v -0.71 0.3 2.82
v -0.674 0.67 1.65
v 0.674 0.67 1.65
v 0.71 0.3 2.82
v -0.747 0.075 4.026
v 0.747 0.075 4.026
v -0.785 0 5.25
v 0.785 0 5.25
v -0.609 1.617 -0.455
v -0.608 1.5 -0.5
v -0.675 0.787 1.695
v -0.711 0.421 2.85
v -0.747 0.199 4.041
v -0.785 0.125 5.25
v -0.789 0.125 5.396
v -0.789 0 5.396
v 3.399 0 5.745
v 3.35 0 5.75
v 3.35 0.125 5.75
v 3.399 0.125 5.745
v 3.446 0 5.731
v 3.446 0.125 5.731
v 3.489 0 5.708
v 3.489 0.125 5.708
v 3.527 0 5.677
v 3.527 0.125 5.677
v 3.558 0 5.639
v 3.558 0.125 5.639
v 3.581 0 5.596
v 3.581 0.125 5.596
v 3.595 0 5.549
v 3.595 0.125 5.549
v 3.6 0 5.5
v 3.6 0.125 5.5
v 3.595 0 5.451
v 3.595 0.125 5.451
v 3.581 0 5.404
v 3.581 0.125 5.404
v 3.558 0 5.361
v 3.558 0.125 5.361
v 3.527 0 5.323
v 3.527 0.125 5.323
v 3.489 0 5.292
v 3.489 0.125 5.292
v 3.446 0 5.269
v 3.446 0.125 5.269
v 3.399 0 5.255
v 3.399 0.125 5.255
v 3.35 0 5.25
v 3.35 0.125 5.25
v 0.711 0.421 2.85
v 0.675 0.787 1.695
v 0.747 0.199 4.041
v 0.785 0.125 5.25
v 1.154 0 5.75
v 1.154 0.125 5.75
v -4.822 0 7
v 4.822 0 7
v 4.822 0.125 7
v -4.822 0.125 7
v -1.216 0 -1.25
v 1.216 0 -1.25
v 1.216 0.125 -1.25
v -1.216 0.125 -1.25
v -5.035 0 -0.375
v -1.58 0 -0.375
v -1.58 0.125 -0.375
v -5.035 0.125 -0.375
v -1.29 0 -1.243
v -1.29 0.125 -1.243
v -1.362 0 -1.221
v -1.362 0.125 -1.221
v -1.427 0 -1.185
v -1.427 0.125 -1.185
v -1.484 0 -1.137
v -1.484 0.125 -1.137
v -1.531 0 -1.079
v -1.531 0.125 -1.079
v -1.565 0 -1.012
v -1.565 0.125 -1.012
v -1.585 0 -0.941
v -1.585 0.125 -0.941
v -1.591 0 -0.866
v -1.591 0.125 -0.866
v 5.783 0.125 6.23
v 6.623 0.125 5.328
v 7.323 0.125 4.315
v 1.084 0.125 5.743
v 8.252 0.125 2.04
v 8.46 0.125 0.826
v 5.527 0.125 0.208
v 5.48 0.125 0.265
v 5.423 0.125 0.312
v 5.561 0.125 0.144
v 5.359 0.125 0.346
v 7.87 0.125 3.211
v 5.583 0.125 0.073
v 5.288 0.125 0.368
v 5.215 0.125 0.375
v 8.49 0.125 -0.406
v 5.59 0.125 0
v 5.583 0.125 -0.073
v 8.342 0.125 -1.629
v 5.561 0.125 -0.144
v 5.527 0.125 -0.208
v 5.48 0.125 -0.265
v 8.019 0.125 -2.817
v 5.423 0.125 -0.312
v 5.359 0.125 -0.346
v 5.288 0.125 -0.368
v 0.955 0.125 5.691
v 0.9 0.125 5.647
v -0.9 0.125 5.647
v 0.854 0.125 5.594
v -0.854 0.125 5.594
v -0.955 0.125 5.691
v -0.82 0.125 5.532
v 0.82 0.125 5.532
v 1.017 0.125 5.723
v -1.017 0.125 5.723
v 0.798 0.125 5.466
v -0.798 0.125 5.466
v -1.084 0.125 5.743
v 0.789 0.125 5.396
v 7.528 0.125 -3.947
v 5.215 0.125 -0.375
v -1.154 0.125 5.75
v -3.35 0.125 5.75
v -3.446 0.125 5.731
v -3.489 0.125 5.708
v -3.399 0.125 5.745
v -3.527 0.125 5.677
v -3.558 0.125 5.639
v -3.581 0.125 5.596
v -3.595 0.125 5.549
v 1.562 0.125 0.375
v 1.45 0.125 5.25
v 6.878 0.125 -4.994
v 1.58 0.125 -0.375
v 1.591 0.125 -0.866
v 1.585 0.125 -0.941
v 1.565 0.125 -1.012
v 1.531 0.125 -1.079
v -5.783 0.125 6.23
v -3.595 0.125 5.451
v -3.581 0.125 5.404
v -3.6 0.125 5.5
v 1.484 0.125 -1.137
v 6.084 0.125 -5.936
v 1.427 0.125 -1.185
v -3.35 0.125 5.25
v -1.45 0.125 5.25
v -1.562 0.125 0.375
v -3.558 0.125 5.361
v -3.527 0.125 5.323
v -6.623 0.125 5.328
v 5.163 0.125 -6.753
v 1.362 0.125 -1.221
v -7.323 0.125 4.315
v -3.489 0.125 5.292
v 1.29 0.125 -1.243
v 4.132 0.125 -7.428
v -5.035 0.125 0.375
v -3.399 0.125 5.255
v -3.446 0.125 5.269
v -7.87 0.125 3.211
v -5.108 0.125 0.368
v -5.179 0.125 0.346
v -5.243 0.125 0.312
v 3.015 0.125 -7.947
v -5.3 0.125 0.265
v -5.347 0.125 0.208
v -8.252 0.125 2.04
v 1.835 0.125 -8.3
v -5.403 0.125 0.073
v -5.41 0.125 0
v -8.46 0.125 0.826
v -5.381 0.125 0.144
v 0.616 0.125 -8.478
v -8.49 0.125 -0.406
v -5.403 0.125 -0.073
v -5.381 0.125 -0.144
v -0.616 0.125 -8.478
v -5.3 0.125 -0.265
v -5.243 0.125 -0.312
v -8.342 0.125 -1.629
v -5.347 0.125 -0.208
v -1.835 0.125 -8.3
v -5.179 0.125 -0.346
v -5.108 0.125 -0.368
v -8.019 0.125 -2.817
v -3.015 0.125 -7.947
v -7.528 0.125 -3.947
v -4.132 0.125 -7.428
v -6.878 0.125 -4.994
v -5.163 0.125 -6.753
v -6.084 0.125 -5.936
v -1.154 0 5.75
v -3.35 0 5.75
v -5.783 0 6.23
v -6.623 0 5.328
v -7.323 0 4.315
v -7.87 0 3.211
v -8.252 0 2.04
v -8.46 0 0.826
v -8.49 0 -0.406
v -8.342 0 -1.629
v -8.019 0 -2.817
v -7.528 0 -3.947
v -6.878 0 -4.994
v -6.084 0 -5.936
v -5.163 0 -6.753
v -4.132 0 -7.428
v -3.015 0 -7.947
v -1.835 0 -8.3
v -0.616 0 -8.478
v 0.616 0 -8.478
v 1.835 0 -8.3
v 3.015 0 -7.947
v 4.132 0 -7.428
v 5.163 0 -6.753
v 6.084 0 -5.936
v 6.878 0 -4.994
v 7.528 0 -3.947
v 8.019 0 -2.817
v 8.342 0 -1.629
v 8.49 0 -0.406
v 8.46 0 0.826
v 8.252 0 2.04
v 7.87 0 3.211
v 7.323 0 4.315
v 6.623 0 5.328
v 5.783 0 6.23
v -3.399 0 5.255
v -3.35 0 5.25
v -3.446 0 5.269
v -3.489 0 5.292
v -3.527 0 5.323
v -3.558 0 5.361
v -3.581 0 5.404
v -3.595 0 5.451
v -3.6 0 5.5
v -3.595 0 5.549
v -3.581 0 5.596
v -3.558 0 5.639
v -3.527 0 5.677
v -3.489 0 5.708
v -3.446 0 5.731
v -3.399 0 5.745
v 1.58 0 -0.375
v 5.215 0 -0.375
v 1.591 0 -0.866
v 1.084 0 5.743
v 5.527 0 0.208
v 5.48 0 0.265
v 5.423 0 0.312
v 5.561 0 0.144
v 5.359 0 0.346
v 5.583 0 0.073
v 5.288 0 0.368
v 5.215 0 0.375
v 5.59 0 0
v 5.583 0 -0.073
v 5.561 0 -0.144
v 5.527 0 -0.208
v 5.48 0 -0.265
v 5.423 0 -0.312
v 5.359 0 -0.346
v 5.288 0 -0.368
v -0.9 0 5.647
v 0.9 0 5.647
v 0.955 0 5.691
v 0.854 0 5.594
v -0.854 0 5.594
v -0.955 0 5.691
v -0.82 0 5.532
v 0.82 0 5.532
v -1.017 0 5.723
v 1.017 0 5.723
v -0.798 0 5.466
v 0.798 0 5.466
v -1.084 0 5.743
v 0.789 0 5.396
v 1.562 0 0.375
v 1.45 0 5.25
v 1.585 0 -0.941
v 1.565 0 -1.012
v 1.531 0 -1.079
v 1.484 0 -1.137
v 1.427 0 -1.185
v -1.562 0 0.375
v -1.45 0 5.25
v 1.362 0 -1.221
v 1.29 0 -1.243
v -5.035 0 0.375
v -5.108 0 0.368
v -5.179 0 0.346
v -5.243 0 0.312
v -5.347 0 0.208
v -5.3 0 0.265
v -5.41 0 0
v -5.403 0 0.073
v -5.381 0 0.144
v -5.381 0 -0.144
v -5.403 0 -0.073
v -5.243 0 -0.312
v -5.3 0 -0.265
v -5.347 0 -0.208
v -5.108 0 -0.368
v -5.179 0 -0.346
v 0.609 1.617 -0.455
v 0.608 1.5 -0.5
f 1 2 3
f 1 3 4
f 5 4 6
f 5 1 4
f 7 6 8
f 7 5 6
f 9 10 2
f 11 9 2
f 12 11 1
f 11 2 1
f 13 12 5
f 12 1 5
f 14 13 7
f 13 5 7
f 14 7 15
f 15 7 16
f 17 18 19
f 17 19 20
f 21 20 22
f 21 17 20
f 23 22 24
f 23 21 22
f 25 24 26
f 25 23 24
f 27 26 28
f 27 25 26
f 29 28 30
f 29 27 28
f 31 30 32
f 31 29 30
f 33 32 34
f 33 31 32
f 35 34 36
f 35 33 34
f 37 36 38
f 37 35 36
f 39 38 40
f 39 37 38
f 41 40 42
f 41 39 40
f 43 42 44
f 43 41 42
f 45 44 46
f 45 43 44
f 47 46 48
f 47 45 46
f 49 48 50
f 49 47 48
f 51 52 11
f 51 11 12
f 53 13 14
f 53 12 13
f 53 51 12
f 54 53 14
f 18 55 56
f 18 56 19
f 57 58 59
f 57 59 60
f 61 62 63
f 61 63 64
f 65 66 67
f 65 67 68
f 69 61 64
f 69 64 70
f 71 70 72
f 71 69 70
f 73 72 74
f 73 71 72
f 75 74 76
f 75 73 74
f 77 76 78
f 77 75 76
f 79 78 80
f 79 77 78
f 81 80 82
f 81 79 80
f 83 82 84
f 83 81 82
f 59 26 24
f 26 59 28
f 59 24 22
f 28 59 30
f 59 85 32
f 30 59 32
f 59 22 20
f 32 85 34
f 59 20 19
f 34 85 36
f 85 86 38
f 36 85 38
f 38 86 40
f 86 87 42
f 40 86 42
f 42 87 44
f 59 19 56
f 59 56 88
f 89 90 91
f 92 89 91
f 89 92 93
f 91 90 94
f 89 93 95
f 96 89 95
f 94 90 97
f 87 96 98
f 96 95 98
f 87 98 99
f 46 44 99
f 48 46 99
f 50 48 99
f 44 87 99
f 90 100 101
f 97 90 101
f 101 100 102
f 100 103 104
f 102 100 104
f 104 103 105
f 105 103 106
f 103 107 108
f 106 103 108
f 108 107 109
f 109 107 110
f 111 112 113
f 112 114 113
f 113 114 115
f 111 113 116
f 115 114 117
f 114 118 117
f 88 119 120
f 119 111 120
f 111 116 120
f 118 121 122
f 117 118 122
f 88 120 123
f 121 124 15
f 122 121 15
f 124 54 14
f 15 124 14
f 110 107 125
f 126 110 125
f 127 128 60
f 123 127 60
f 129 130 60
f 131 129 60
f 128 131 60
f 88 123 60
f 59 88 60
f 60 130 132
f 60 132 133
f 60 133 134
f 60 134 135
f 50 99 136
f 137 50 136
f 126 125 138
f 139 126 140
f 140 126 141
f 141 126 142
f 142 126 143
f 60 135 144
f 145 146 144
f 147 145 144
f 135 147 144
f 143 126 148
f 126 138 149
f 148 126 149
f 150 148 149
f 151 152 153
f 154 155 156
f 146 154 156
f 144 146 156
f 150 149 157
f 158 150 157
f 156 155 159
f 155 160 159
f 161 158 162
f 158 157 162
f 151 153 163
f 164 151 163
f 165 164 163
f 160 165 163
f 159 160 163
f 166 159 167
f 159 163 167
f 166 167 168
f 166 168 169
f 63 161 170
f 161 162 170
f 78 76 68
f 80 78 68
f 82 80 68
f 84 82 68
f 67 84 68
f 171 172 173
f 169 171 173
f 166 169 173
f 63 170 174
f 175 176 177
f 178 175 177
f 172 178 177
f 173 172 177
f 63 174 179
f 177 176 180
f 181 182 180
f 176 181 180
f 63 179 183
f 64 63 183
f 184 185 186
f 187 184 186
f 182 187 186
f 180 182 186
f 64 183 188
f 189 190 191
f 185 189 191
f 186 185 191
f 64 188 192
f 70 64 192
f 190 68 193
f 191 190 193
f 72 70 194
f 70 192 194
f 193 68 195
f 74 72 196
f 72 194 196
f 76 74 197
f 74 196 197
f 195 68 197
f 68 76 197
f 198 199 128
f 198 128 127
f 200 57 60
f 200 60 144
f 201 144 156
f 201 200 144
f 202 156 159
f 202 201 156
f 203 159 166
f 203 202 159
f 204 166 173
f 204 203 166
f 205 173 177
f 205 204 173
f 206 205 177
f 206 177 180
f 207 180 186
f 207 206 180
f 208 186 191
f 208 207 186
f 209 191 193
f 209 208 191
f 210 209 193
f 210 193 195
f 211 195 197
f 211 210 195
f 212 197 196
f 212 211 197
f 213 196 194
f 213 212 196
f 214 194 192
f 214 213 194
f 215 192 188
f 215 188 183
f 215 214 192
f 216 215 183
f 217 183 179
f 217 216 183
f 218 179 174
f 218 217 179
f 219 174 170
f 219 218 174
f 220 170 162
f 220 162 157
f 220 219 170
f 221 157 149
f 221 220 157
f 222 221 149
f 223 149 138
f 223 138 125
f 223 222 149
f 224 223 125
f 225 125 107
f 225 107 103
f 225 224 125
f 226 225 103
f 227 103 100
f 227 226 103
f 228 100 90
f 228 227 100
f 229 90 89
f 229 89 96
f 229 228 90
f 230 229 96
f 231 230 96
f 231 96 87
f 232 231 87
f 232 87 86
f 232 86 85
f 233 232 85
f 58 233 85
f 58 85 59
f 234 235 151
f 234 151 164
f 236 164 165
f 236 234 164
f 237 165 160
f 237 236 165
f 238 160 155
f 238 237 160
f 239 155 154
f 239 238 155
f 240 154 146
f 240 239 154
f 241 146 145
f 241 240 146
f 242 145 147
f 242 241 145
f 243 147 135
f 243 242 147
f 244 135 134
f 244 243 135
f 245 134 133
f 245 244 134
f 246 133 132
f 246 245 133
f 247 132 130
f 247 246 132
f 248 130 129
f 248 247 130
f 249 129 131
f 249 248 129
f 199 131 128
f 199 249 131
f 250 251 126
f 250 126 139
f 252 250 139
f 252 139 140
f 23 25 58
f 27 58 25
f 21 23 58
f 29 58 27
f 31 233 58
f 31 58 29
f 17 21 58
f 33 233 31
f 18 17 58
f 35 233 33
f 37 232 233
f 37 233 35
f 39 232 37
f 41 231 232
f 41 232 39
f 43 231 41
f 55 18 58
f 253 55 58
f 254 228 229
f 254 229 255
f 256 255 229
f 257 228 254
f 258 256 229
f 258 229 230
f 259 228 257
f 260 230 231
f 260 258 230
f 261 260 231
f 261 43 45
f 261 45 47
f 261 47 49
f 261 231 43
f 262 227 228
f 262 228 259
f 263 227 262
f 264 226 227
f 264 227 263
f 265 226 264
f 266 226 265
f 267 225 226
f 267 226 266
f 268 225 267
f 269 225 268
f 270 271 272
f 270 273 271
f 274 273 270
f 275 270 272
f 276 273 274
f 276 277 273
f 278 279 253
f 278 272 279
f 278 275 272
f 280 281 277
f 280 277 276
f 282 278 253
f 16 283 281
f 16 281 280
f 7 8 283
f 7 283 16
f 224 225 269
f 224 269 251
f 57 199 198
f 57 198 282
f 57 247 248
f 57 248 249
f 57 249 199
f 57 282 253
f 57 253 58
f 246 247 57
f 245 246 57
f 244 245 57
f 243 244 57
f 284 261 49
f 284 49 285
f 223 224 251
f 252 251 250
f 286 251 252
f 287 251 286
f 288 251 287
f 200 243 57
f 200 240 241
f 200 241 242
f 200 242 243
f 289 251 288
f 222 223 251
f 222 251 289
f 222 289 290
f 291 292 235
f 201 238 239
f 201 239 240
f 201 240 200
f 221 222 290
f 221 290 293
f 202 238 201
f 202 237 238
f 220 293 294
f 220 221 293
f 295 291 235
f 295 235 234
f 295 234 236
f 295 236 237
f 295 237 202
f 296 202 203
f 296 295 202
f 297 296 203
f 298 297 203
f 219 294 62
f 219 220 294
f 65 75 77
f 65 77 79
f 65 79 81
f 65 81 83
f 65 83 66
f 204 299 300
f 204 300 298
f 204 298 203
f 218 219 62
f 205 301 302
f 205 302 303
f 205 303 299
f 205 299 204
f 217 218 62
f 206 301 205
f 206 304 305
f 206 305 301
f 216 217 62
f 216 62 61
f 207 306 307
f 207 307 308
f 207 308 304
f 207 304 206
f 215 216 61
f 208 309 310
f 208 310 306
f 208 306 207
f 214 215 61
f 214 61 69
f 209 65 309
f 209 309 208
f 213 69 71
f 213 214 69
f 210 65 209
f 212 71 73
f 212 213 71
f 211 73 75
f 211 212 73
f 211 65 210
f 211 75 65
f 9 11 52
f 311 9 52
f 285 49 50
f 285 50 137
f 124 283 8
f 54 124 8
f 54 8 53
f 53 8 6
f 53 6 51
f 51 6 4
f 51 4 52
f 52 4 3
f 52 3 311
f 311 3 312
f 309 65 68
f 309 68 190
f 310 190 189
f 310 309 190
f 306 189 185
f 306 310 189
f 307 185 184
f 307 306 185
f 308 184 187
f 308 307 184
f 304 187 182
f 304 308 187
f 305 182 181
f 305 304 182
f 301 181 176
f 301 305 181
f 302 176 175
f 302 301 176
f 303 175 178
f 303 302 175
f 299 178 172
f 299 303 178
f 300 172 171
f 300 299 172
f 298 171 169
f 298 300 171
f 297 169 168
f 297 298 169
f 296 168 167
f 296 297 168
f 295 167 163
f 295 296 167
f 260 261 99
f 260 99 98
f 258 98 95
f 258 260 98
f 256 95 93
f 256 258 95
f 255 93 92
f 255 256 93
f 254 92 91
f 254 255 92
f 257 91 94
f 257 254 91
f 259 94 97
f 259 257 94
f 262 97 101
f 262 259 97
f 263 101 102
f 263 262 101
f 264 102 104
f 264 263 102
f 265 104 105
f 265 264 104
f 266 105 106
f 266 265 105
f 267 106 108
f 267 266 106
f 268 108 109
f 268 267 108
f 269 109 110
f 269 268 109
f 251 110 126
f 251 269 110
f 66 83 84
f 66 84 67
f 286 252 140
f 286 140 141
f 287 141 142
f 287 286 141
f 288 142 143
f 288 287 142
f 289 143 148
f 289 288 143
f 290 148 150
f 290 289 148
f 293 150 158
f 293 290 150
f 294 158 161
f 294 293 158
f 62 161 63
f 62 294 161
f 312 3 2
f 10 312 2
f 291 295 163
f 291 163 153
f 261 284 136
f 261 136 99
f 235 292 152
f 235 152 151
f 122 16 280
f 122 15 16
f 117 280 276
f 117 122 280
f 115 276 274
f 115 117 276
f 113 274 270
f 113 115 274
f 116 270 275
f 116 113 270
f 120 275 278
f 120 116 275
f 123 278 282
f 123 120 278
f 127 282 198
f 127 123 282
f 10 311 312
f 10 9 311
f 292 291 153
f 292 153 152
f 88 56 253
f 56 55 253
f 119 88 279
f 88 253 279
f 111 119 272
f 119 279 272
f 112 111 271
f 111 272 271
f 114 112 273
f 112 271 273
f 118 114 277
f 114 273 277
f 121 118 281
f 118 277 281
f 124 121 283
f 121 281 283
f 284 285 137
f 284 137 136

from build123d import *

# Parameters (mm, degrees)
EXTRUDE1_DEPTH = 0.125
SKETCH3_W      = 1.6
SKETCH3_H      = 0.125
EXTRUDE2_DEPTH = 2.616620884
FILLET3_R      = 0.365


with BuildPart() as part:
    # Sketch1 → Extrude1 (new body)
    with BuildSketch(Plane(origin=(0, 0, 0), x_dir=(1, 0, 0), z_dir=(0, 1, 0))):
        with BuildLine():
            Line((4.82182538, -7), (-4.82182538, -7))
            ThreePointArc((-4.82182538, -7), (0, 8.5), (4.82182538, -7))
        make_face()
        with BuildLine():
            Line((1.5625, -0.375), (5.215, -0.375))
            ThreePointArc((5.215, -0.375), (5.59, 0), (5.215, 0.375))
            Line((5.215, 0.375), (1.579807692, 0.375))
            Line((1.579807692, 0.375), (1.591146503, 0.866348457))
            ThreePointArc((1.591146503, 0.866348457), (1.484452699, 1.137088412), (1.216246315, 1.25))
            Line((1.216246315, 1.25), (-1.216246315, 1.25))
            ThreePointArc((-1.216246315, 1.25), (-1.484452699, 1.137088412), (-1.591146503, 0.866348457))
            Line((-1.591146503, 0.866348457), (-1.579807692, 0.375))
            Line((-1.579807692, 0.375), (-5.035, 0.375))
            ThreePointArc((-5.035, 0.375), (-5.41, 0), (-5.035, -0.375))
            Line((-5.035, -0.375), (-1.5625, -0.375))
            Line((-1.5625, -0.375), (-1.45, -5.25))
            Line((-1.45, -5.25), (-3.35, -5.25))
            ThreePointArc((-3.35, -5.25), (-3.6, -5.5), (-3.35, -5.75))
            Line((-3.35, -5.75), (3.35, -5.75))
            ThreePointArc((3.35, -5.75), (3.6, -5.5), (3.35, -5.25))
            Line((3.35, -5.25), (1.45, -5.25))
            Line((1.45, -5.25), (1.5625, -0.375))
        make_face(mode=Mode.SUBTRACT)
    extrude(amount=EXTRUDE1_DEPTH)

    # Sweep2: sweep along a path in Sketch2
    with BuildLine(Plane(origin=(0, 0, 0), x_dir=(0, 0, -1), z_dir=(1, 0, 0))) as sweep2_path:
        Line((0.5, 1.5), (-1.650382858, 0.670329243))
        ThreePointArc((-1.650382858, 0.670329243), (-3.419249821, 0.169010539), (-5.25, 0))
        Line((-5.25, 0), (-5.75, 0))
    # Sketch3 → Sweep2 (sweep)
    with BuildSketch(Plane(origin=(0, 0, 5.75), x_dir=(-1, 0, 0), z_dir=(0, 0, -1))):
        with Locations((0, 0.0625)):
            Rectangle(SKETCH3_W, SKETCH3_H)
    sweep(path=sweep2_path.line)

    # Sketch5 → Extrude2 (cut, through all)
    with BuildSketch(Plane(origin=(0, 0, 0), x_dir=(1, 0, 0), z_dir=(0, 1, 0))):
        Polygon((-0.6, 0.75), (-0.8, -5.75), (-1.2, -5.75), (-1.2, 1), (1.2, 1), (1.2, -5.75), (0.8, -5.75), (0.6, 0.75), align=None)
    extrude(amount=EXTRUDE2_DEPTH, mode=Mode.SUBTRACT)

    # Fillet3
    fillet3_edges = [part.edges().sort_by_distance(p)[0] for p in [
        (0.8, 0.0625, 5.75),
        (-0.8, 0.0625, 5.75),
    ]]
    fillet(fillet3_edges, radius=FILLET3_R)


solid = part.part
